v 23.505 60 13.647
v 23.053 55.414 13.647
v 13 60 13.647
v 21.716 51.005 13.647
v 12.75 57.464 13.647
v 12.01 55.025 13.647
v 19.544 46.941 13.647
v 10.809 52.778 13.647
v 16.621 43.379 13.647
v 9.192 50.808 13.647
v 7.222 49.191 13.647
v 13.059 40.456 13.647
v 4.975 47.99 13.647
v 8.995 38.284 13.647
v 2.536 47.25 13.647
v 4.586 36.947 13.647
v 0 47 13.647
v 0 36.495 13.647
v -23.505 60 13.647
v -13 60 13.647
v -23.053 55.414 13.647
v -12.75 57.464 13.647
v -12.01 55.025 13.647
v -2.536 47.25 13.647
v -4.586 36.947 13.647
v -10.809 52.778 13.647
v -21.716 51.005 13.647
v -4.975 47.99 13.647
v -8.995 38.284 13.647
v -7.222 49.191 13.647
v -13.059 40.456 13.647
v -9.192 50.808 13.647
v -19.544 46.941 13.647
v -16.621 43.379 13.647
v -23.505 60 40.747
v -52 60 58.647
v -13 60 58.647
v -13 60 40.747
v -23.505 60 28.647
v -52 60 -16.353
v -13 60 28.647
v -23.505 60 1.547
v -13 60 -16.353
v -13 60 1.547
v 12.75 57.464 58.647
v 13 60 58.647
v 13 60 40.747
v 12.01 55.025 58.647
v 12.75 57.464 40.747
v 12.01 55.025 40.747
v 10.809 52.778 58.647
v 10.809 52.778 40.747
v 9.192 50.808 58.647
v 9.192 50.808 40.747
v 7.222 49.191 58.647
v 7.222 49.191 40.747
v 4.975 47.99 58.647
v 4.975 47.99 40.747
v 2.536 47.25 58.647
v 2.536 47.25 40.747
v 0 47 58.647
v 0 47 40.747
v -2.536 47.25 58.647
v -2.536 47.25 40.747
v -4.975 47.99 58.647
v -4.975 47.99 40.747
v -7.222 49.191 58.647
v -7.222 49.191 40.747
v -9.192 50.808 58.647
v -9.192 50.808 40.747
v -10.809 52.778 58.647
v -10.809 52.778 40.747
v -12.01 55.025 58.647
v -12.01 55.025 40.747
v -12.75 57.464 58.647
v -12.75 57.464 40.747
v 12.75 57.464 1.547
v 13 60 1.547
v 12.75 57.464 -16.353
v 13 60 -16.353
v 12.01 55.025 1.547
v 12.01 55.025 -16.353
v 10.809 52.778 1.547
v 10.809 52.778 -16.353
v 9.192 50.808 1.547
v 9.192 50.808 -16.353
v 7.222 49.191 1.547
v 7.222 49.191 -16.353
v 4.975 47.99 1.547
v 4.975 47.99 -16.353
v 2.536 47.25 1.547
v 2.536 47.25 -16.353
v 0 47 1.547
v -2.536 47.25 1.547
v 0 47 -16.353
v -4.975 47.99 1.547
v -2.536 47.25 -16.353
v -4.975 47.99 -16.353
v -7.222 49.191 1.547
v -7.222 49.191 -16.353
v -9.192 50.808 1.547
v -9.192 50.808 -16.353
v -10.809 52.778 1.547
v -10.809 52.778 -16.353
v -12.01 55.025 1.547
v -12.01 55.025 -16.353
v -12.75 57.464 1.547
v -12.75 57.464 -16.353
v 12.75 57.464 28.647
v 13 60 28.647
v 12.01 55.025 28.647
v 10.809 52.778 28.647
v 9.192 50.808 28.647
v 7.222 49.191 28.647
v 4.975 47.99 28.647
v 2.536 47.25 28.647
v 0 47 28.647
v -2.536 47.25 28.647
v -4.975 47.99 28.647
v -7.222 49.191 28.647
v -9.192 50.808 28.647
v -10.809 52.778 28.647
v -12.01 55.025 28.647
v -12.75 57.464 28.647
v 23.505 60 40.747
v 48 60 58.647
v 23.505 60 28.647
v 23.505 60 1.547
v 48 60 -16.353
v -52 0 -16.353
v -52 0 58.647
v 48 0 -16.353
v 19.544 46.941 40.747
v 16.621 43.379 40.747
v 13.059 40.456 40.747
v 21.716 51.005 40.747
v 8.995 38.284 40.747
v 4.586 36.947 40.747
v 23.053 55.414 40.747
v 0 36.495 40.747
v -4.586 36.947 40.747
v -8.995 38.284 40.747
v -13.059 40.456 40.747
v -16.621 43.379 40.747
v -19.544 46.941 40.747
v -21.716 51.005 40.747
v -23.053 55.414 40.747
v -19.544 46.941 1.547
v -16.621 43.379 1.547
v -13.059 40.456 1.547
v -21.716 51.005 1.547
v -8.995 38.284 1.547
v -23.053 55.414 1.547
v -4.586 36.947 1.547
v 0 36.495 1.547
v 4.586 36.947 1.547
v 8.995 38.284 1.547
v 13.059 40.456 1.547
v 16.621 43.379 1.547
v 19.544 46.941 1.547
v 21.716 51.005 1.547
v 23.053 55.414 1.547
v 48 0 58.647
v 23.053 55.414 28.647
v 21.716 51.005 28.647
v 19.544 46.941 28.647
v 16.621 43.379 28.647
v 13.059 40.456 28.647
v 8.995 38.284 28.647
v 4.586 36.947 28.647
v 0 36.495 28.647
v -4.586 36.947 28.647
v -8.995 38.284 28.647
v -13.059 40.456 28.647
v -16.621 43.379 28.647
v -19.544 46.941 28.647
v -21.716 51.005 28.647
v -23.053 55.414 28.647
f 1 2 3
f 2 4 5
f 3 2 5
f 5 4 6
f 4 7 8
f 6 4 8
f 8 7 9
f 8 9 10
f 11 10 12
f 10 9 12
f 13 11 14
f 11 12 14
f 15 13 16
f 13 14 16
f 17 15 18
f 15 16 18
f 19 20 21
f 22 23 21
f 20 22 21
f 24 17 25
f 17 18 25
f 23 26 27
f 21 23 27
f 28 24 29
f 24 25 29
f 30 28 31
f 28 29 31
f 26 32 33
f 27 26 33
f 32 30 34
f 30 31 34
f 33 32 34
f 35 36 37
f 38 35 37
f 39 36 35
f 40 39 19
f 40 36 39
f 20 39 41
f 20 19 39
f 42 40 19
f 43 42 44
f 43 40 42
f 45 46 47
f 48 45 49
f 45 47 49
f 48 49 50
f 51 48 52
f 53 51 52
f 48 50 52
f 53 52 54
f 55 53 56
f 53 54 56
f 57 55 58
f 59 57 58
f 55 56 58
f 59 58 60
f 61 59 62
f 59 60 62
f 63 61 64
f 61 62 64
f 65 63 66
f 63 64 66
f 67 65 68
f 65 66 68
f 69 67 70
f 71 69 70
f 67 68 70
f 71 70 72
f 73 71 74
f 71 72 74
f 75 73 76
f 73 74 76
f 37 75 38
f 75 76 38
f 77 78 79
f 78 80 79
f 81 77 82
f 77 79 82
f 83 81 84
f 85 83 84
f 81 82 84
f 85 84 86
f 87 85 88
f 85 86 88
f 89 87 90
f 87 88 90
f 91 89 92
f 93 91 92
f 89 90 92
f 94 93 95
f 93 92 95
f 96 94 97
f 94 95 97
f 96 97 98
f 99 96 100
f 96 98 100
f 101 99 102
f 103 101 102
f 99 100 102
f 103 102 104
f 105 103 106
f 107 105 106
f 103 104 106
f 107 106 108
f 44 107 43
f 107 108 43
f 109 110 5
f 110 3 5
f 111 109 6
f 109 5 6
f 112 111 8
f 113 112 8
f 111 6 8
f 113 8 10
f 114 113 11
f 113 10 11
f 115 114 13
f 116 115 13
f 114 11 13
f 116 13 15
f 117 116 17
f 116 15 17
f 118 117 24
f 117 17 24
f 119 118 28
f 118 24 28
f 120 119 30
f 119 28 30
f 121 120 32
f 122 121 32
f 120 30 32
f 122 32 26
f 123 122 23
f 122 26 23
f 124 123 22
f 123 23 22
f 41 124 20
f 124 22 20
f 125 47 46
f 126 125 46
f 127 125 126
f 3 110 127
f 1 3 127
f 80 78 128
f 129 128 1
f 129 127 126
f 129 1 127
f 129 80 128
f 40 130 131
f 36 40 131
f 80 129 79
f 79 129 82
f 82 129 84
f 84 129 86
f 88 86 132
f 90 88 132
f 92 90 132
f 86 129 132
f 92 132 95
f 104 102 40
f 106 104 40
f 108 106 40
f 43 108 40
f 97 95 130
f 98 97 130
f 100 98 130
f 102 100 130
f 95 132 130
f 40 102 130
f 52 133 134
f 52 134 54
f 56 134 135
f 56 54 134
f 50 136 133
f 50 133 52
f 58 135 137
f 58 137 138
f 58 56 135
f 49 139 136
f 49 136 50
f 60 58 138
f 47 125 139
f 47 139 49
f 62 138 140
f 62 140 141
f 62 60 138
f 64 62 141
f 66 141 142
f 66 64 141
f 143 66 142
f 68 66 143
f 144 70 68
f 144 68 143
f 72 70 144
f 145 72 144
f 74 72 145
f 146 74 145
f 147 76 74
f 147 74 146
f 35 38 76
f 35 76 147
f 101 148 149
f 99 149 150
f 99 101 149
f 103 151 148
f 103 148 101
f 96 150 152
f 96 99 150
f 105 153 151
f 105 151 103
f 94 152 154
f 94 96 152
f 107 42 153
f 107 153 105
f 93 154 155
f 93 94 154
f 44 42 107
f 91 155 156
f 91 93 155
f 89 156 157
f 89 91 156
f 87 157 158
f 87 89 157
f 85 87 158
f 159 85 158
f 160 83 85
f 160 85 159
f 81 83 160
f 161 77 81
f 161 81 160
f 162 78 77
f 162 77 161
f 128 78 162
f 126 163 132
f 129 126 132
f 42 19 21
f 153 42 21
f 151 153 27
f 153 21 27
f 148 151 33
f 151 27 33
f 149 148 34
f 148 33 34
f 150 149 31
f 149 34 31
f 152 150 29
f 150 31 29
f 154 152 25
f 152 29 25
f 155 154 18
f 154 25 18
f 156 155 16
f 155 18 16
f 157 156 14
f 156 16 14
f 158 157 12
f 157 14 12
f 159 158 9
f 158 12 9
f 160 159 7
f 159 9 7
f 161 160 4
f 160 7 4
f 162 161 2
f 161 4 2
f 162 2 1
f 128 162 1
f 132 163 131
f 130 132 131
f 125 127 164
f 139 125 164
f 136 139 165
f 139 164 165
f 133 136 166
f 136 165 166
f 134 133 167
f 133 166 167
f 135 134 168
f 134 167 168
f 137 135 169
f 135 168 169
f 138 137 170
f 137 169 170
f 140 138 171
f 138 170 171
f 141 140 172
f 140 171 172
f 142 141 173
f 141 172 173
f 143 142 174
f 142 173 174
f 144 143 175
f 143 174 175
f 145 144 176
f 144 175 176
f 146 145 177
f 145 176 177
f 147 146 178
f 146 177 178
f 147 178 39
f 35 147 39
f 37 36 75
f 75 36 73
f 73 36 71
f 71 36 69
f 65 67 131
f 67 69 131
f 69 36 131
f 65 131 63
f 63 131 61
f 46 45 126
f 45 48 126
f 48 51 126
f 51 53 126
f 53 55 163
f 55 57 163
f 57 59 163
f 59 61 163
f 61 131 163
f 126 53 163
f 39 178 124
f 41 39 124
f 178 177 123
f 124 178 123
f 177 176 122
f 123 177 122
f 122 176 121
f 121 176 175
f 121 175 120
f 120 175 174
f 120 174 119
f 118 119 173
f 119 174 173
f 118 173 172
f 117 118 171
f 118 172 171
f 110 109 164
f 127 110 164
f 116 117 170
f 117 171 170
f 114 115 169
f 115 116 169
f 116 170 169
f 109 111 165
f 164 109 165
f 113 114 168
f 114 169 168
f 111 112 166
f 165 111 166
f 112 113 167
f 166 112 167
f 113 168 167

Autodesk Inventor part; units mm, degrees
ref_plane "YZ Plane" through (0, 0, 0) normal (1, 0, 0) x (0, 1, 0)
ref_plane "XZ Plane" through (0, 0, 0) normal (0, 1, 0) x (-1, 0, 0)
ref_plane "XY Plane" through (0, 0, 0) normal (0, 0, 1) x (1, 0, 0)
sketch "Sketch1" plane through (0, 0, 0) normal (0, 1, 0) x (-1, 0, 0)
  line L0 (52, 58.6471) -> (-48, 58.6471)
  line L1 (-48, 58.6471) -> (-48, -16.3529)
  line L2 (-48, -16.3529) -> (52, -16.3529)
  line L3 (52, -16.3529) -> (52, 58.6471)
  point P0 (0, 0)
  dimension "d0" = 100
  dimension "d1" = 75
extrude "Extrusion1" add sketch "Sketch1" along normal blind 60
sketch "Sketch2" plane through (0, 60, 0) normal (0, 1, 0) x (1, 0, 0)
  line L0 (-47, -53.6471) -> (43, -53.6471)
  line L1 (43, -53.6471) -> (43, 11.3529)
  line L2 (43, 11.3529) -> (-47, 11.3529)
  line L3 (-47, 11.3529) -> (-47, -53.6471)
  line L4 (-52, 16.3529) -> (-52, -58.6471) projected
  line L5 (-52, -58.6471) -> (48, -58.6471) projected
  line L6 (48, 16.3529) -> (-52, 16.3529) projected
  line L7 (48, -58.6471) -> (48, 16.3529) projected
  point P0 (0, 0)
  dimension "d4" = 5
  dimension "d5" = 5
  dimension "d6" = 5
  dimension "d7" = 5
extrude "Extrusion2" cut sketch "Sketch2" against normal blind 59 contours L3 L2 L1 L0
sketch "Sketch3" plane through (48, 0, -16.3529) normal (0, 0, -1) x (-1, 0, 0)
  circle A0 centre (48, 60) radius 13
  point P0 (48, 0)
  dimension "d10" = 26
  dimension "d11" = 60
sketch "Sketch13" plane through (0, 1, 0) normal (0, 1, 0) x (1, 0, 0)
  line L0 (-47, -53.6471) -> (-47, 11.3529) projected
  line L1 (43, 11.3529) -> (43, -53.6471) projected
  line L2 (-47, 11.3529) -> (43, 11.3529)
  line L3 (43, 11.3529) -> (43, -13.6471)
  line L4 (43, -13.6471) -> (-47, -13.6471)
  line L5 (-47, -13.6471) -> (-47, 11.3529)
  point P0 (0, 0)
  dimension "d44" = 25
extrude "Extrusion14" add sketch "Sketch13" along normal blind 59
sketch "Sketch14" plane through (-47, 1, 13.6471) normal (0, 0, 1) x (1, 0, 0)
  line L0 (0, 59) -> (90, 59) projected
  circle A0 centre (47, 59) radius 23.505
  point P0 (47, -1)
  dimension "d47" = 47.01
extrude "Extrusion15" cut sketch "Sketch14" against normal blind 12.1
sketch "Sketch15" plane through (0, 1, 0) normal (0, 1, 0) x (1, 0, 0)
  line L0 (-47, -53.6471) -> (-47, -13.6471) projected
  line L1 (43, -13.6471) -> (43, -53.6471) projected
  line L2 (-47, -53.6471) -> (43, -53.6471)
  line L3 (43, -53.6471) -> (43, -28.6471)
  line L4 (43, -28.6471) -> (-47, -28.6471)
  line L5 (-47, -28.6471) -> (-47, -53.6471)
  point P0 (0, 0)
  point P1 (-47, -28.6471)
  dimension "d50" = 25
extrude "Extrusion16" add sketch "Sketch15" along normal blind 59
sketch "Sketch16" plane through (43, 1, 28.6471) normal (0, 0, -1) x (-1, 0, 0)
  line L0 (0, 59) -> (90, 59) projected
  circle A0 centre (43, 59) radius 23.505
  point P0 (43, -1)
  dimension "d53" = 47.01
extrude "Extrusion17" cut sketch "Sketch16" against normal blind 12.1
sketch "Sketch17" plane through (0, 1, 0) normal (0, 1, 0) x (1, 0, 0)
  line L0 (23.505, -13.6471) -> (43, -13.6471) projected
  line L1 (-47, -28.6471) -> (43, -28.6471)
  line L2 (43, -28.6471) -> (43, -13.6471)
  line L3 (43, -13.6471) -> (-47, -13.6471)
  line L4 (-47, -13.6471) -> (-47, -28.6471)
  point P0 (0, 0)
extrude "Extrusion18" add sketch "Sketch17" along normal blind 59
extrude "Extrusion19" cut sketch "Sketch3" against normal blind 75
equation "\"d6\" = d5"
equation "\"d7\" = d4"
properties part number "new_box_bottom"
